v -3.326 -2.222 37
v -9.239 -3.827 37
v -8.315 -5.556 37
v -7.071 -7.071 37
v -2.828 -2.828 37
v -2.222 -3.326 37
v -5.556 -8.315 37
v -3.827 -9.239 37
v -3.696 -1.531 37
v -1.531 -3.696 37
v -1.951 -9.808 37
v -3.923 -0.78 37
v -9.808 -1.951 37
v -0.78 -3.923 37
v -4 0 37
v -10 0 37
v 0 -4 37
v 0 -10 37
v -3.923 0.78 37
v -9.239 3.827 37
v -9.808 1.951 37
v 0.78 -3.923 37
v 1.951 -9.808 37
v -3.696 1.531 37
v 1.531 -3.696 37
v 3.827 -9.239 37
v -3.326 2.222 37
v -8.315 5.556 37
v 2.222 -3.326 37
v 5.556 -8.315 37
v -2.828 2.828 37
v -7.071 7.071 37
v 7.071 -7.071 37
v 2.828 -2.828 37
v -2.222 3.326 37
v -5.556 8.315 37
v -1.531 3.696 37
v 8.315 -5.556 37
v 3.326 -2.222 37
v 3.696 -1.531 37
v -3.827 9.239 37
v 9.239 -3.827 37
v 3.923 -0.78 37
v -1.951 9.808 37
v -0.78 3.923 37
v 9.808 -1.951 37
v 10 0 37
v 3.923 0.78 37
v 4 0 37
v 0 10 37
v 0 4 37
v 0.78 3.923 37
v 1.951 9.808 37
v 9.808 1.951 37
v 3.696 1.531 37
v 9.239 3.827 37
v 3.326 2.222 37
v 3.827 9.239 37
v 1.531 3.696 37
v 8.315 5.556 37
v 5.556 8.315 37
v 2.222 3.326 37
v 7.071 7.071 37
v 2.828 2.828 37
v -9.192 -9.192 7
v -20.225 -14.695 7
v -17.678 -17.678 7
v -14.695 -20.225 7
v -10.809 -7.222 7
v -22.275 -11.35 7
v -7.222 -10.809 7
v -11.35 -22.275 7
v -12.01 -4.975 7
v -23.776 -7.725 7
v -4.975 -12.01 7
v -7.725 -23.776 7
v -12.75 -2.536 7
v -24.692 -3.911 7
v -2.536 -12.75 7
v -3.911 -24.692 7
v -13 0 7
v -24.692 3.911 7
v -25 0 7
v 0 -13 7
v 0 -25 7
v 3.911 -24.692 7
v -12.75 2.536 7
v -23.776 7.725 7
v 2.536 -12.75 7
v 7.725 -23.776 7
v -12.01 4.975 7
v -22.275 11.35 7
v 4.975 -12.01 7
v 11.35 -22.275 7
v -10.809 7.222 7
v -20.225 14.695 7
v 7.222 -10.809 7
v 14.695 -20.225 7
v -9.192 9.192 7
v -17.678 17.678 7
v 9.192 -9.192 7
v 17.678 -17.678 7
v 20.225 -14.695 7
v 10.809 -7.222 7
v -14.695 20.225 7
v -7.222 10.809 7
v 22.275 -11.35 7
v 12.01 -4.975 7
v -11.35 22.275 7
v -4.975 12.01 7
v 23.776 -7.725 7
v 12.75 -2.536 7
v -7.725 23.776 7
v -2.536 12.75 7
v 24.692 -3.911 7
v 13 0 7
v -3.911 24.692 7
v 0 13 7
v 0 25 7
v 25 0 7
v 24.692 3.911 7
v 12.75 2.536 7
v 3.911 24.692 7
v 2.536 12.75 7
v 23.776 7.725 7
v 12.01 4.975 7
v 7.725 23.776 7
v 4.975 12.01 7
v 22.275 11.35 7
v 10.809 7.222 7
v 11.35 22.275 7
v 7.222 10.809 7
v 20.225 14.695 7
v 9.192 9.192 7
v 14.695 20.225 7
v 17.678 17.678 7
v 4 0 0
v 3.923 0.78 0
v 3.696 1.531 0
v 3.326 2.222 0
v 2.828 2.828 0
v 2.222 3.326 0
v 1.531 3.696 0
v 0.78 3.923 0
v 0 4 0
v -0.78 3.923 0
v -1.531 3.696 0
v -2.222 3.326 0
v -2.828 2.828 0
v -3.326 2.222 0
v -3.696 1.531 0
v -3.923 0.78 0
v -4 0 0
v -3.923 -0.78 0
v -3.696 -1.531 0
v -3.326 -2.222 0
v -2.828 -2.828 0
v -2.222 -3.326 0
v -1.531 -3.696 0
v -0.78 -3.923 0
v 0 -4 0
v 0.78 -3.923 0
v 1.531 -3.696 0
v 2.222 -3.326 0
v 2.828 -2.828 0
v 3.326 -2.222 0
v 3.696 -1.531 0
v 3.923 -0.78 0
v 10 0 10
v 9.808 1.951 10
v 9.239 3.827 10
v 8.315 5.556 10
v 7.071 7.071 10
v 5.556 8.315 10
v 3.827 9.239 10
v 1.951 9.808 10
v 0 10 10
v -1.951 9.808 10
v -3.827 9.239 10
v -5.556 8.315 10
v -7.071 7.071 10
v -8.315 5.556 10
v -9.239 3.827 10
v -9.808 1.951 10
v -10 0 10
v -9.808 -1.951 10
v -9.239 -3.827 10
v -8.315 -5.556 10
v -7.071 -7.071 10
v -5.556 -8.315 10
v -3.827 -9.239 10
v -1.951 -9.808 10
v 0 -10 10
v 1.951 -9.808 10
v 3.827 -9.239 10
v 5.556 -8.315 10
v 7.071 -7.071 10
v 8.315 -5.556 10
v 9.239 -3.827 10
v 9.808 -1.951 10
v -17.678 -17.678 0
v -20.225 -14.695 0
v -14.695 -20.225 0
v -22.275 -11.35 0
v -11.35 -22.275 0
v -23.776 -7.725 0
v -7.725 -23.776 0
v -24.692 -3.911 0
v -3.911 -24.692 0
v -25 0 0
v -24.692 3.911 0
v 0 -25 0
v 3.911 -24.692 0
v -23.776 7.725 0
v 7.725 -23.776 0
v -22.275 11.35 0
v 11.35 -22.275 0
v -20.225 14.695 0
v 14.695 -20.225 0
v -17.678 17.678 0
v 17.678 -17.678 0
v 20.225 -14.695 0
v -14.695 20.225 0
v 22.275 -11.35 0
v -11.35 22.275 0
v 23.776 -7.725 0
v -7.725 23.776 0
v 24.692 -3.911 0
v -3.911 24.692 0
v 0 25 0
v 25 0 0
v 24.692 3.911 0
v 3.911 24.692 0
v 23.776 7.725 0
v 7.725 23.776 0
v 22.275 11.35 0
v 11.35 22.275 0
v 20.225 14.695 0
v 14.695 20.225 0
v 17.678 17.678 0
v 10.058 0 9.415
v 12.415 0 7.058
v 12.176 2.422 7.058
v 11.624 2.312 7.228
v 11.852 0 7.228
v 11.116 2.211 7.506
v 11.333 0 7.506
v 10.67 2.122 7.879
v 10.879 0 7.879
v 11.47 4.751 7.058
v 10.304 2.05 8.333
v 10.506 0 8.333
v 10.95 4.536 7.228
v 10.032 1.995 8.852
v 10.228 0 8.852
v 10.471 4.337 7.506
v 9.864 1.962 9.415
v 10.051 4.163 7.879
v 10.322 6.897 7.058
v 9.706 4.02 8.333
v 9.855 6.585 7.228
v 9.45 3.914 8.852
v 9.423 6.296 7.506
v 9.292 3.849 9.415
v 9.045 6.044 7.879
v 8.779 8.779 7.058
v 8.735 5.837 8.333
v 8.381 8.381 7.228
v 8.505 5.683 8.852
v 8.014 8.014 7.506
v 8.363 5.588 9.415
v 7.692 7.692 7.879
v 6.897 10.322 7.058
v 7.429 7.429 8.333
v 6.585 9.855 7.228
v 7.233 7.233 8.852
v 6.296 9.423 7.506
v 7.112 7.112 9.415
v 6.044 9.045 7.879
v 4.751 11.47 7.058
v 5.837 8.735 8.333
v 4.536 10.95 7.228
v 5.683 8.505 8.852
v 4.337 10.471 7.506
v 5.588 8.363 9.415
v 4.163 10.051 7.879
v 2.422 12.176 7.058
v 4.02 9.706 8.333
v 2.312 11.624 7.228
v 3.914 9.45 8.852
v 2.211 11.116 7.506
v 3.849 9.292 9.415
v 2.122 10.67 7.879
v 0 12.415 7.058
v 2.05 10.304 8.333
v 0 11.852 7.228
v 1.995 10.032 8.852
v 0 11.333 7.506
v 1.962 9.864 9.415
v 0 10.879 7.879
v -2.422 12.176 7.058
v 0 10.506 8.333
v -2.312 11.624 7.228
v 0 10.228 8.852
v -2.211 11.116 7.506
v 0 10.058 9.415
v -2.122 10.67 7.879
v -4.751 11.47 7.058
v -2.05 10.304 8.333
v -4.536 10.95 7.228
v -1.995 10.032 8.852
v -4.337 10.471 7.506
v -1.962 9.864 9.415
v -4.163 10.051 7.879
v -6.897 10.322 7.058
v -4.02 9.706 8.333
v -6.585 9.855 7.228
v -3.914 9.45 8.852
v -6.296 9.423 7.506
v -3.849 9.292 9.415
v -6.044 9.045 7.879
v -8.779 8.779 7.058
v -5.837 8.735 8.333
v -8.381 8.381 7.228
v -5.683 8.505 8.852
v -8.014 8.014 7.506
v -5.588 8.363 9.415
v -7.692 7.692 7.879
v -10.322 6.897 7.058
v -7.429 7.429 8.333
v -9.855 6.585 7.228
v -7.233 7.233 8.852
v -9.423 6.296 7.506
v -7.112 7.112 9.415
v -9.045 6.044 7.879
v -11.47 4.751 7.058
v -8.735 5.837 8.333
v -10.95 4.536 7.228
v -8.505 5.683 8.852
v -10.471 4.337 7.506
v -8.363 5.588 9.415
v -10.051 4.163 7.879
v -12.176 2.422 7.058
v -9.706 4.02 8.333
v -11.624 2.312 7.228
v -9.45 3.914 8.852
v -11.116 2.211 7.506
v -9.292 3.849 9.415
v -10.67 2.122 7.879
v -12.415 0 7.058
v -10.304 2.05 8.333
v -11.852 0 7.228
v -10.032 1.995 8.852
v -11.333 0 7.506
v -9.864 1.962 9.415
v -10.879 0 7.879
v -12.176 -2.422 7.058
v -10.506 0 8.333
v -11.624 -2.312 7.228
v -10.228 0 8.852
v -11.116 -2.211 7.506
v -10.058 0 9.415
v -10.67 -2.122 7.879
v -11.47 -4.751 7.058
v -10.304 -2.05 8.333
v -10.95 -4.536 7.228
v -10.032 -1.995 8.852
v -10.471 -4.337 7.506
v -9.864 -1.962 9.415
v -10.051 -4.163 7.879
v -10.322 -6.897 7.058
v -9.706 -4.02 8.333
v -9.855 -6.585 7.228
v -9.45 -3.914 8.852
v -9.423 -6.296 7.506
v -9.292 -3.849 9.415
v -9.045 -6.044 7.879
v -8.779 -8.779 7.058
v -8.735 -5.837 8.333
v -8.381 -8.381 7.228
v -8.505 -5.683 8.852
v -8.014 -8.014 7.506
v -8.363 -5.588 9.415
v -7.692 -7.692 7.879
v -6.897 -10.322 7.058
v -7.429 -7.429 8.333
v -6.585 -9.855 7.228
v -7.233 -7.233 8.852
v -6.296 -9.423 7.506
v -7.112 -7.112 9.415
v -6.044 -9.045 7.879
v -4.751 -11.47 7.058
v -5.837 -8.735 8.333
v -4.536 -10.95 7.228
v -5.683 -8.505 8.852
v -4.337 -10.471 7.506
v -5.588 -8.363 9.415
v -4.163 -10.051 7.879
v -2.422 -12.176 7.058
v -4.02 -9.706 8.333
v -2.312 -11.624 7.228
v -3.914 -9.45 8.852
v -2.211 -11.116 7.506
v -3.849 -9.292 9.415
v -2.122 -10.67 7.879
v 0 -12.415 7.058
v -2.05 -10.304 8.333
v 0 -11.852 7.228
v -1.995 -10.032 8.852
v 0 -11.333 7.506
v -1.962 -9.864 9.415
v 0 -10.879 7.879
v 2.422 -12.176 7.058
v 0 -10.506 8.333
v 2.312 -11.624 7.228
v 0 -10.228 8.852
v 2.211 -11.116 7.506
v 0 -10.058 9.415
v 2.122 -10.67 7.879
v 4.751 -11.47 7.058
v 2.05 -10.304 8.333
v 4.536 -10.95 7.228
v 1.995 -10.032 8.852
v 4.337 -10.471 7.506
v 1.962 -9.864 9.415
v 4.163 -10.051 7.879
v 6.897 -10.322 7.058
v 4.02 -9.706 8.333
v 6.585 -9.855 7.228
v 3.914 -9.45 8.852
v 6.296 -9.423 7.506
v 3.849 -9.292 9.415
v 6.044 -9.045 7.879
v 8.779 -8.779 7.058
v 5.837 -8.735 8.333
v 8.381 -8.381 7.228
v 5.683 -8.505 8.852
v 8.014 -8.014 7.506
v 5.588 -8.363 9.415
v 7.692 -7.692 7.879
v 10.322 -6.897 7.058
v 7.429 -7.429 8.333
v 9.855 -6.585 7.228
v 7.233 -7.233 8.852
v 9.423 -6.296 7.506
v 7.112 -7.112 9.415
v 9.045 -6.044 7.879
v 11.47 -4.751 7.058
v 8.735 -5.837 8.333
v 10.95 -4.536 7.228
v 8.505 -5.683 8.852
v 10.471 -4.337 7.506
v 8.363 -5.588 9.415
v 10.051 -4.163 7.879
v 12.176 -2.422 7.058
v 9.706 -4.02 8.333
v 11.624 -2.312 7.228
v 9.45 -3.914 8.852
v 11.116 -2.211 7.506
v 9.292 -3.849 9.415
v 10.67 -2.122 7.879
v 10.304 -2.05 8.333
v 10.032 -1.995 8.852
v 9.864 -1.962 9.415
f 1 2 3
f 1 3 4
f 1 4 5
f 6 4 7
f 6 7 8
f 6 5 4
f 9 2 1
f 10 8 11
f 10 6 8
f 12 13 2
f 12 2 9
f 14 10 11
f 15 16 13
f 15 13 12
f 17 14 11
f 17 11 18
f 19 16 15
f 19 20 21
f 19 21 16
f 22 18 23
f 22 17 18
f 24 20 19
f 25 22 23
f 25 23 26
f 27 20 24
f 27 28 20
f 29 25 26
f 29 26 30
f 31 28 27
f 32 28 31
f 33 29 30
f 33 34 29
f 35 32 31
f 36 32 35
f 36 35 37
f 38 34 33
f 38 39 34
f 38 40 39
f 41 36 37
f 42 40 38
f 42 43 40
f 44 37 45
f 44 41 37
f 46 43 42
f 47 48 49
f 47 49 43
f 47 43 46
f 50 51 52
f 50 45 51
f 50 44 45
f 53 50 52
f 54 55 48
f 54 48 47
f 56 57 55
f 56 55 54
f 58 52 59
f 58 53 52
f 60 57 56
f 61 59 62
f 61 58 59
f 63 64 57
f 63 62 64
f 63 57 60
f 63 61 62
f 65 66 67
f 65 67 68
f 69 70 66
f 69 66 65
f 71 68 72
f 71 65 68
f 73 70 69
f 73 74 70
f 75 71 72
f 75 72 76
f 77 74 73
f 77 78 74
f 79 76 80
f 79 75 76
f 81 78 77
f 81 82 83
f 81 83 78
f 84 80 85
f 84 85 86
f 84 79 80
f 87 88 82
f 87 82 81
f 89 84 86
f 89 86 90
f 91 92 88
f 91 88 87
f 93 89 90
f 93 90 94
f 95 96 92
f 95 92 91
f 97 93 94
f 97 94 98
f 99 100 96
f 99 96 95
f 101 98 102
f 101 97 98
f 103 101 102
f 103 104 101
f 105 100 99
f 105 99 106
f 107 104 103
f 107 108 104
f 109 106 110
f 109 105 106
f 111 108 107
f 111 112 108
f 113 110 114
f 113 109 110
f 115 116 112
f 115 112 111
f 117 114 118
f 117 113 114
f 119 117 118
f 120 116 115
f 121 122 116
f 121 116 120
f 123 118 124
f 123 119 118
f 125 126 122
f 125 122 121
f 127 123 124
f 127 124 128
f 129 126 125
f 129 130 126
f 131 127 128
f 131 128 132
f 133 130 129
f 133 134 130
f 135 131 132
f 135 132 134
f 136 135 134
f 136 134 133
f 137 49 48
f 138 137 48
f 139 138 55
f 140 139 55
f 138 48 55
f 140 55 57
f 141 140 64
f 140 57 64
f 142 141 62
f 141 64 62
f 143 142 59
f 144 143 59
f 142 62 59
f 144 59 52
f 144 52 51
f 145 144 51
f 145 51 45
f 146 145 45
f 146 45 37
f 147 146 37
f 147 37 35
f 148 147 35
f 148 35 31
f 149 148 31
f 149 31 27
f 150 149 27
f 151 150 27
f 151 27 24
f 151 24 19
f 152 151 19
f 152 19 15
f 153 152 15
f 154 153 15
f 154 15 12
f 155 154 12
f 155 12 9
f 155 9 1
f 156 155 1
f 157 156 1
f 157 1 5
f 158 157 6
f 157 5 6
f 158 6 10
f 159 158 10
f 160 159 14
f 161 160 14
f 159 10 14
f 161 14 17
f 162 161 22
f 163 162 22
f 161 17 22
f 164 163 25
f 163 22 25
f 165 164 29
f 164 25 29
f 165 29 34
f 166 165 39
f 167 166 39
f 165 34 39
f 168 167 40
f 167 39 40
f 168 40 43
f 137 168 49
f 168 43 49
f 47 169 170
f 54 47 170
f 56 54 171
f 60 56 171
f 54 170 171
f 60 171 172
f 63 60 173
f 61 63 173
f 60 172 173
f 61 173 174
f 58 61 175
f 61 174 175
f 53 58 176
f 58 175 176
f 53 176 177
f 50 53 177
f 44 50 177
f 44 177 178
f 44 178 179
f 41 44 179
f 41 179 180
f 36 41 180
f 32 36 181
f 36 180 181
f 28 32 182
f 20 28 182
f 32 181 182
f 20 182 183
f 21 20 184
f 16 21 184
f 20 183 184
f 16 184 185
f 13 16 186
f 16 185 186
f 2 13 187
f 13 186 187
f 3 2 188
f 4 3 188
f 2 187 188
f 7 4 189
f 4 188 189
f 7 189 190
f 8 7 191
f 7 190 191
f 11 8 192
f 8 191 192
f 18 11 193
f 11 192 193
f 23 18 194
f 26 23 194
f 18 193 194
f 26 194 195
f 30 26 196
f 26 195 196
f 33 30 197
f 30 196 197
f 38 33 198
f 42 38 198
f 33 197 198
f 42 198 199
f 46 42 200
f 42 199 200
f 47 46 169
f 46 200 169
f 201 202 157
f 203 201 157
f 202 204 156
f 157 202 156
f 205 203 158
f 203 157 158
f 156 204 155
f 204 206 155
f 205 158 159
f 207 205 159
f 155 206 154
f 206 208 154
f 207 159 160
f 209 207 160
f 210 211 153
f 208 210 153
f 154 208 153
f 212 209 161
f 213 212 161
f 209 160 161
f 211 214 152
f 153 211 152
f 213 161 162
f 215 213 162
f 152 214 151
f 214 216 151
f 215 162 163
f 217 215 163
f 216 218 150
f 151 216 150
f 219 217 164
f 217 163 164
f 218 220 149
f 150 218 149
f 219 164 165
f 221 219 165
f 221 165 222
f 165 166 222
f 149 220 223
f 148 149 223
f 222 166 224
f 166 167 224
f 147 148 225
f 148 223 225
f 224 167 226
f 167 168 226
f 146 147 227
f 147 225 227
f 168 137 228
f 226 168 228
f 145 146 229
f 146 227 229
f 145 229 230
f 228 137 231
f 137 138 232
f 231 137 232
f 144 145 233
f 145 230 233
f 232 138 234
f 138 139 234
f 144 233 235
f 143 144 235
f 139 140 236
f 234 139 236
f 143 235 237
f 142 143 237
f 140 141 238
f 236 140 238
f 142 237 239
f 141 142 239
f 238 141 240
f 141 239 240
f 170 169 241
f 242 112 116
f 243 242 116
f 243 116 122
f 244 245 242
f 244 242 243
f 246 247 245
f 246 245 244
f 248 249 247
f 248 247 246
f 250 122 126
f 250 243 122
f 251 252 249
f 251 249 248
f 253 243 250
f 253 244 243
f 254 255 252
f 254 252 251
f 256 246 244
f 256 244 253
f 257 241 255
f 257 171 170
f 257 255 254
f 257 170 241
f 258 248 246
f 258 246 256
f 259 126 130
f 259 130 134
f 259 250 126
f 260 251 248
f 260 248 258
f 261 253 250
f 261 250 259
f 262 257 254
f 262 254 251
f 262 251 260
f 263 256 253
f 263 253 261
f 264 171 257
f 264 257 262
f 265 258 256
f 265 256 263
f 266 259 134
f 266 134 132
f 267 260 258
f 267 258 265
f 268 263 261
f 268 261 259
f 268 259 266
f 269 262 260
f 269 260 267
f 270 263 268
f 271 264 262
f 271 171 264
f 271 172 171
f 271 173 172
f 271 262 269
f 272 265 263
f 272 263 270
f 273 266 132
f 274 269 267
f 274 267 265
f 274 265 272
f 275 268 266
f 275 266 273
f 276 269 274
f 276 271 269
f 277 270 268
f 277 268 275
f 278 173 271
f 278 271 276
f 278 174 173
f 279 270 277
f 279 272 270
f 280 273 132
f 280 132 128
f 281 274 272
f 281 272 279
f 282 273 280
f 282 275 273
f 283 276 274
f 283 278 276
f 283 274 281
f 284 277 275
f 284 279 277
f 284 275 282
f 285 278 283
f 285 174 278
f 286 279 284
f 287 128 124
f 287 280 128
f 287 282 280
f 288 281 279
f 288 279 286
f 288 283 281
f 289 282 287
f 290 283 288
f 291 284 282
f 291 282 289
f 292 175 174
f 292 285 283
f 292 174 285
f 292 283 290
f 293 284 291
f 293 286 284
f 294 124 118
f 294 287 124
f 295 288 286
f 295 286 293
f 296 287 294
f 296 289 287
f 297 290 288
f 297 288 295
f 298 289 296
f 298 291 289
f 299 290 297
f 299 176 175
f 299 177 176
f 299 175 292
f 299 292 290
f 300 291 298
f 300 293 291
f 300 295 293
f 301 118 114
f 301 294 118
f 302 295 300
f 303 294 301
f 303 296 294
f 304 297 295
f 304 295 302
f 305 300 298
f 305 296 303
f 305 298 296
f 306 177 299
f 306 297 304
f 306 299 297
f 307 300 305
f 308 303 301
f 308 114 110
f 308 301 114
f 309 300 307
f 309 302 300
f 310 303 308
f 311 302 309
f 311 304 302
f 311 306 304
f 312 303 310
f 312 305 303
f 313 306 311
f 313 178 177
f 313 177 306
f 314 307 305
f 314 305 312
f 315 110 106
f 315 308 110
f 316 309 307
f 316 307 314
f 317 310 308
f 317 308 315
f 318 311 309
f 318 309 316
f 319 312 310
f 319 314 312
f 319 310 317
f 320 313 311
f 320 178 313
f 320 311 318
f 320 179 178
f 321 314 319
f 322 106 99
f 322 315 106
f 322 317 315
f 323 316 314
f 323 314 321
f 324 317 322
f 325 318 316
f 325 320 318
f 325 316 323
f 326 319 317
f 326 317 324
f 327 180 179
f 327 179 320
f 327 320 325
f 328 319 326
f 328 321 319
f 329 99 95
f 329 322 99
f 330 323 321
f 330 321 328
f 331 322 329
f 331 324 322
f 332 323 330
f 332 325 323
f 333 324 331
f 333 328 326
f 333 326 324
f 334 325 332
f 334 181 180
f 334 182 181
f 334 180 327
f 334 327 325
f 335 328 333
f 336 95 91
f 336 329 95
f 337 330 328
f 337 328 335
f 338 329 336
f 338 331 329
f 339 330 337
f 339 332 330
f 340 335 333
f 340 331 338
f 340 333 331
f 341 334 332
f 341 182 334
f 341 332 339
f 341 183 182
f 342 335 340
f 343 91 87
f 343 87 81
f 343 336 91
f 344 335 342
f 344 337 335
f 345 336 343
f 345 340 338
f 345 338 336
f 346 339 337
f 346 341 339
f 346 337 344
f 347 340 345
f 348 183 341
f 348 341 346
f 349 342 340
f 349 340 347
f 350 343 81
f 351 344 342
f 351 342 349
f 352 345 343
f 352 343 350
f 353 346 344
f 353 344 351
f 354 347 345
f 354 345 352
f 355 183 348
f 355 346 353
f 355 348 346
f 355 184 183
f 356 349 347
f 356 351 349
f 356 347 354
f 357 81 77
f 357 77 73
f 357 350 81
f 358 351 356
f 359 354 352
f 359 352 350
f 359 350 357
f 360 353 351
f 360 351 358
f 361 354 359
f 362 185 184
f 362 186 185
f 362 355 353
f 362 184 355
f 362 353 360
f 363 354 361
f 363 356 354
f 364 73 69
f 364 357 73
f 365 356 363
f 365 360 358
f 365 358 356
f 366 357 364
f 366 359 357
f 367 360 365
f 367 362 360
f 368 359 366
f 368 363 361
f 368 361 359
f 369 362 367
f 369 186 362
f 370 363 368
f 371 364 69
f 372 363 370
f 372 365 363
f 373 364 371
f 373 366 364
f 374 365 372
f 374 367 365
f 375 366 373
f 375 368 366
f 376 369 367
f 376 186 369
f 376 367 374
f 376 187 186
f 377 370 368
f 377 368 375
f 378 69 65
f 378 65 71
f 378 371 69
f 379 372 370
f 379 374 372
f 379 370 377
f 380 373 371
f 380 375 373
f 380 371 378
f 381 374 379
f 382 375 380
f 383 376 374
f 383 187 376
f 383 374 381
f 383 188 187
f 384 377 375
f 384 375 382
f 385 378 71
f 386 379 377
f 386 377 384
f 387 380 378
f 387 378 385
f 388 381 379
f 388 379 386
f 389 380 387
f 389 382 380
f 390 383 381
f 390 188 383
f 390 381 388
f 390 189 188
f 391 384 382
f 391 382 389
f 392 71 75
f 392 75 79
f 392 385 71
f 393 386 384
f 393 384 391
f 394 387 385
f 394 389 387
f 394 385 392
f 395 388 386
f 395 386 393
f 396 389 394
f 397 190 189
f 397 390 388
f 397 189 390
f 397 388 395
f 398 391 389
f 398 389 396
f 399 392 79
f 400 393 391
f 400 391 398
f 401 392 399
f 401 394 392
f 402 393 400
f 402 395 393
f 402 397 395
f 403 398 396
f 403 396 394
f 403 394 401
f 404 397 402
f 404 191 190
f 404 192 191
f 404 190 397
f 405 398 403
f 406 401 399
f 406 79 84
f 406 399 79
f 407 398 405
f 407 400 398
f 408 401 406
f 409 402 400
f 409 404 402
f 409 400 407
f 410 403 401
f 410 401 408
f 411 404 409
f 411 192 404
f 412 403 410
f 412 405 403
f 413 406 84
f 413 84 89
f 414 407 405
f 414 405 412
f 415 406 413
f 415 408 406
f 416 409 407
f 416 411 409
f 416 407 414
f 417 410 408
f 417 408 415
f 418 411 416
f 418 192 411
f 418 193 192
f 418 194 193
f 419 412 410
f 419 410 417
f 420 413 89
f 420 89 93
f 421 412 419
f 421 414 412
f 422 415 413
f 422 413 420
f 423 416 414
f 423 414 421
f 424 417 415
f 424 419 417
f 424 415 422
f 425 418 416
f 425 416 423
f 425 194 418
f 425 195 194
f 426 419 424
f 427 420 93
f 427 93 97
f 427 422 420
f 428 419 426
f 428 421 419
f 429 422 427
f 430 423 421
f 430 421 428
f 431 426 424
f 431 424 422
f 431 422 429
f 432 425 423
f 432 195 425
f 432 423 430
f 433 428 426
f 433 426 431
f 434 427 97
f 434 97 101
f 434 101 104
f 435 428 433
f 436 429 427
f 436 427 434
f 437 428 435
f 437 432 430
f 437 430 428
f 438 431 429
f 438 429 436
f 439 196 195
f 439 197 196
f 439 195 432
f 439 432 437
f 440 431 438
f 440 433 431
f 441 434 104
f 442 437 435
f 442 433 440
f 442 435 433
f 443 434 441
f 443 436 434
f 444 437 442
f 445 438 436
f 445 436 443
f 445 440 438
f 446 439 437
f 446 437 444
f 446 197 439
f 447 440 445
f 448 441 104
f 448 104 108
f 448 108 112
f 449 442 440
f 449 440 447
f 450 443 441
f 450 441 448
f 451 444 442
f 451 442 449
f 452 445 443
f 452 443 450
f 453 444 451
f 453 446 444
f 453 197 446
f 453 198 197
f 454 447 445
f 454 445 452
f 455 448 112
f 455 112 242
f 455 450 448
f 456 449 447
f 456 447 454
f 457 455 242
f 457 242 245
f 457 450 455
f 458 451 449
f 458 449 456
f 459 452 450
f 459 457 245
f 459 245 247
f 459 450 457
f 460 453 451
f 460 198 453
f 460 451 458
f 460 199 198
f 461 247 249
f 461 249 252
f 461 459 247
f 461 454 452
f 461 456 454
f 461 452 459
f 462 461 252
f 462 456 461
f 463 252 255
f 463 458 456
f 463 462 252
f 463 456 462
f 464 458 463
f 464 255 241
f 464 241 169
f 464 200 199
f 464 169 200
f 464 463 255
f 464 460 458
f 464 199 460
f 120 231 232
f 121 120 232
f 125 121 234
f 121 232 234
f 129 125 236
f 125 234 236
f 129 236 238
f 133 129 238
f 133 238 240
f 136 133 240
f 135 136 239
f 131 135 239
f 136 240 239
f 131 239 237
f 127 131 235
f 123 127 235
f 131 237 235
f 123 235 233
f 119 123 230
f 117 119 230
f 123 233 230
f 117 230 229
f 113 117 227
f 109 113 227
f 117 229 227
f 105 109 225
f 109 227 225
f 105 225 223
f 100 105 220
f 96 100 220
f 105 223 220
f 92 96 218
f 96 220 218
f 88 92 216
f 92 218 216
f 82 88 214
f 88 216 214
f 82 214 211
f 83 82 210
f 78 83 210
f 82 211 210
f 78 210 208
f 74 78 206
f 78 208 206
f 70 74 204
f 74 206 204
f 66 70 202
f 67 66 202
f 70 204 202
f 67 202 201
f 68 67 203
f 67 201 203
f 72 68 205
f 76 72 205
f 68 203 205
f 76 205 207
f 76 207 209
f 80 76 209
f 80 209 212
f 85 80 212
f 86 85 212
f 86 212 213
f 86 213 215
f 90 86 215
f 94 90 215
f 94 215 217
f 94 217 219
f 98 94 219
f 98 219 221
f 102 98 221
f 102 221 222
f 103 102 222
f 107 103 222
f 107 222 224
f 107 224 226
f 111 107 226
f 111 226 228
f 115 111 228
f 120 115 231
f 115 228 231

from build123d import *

# Parameters (mm, degrees)
SKETCH_1_R          = 25
EXTRUDE_1_DEPTH     = 7
SKETCH_2_R          = 10
EXTRUDE_2_DEPTH     = 30
FILLET_1_R          = 3
SKETCH_3_R          = 4
CUT_EXTRUDE_3_DEPTH = 52.176166328


with BuildPart() as part:
    # Эскиз1 → Вытянуть1 (new body)
    with BuildSketch(Plane.XY):
        Circle(SKETCH_1_R)
    extrude(amount=EXTRUDE_1_DEPTH)

    # Эскиз2 → Вытянуть2 (add)
    with BuildSketch(Plane.XY.offset(7)):
        Circle(SKETCH_2_R)
    extrude(amount=EXTRUDE_2_DEPTH)

    # Скругление1
    fillet_1_edges = [part.edges().sort_by_distance(p)[0] for p in [
        (-10, 0, 7),
    ]]
    fillet(fillet_1_edges, radius=FILLET_1_R)

    # Эскиз3 → Вытянуть3 (cut, through all)
    with BuildSketch(Plane.XY.offset(37)):
        Circle(SKETCH_3_R)
    extrude(amount=-CUT_EXTRUDE_3_DEPTH, mode=Mode.SUBTRACT)


solid = part.part
